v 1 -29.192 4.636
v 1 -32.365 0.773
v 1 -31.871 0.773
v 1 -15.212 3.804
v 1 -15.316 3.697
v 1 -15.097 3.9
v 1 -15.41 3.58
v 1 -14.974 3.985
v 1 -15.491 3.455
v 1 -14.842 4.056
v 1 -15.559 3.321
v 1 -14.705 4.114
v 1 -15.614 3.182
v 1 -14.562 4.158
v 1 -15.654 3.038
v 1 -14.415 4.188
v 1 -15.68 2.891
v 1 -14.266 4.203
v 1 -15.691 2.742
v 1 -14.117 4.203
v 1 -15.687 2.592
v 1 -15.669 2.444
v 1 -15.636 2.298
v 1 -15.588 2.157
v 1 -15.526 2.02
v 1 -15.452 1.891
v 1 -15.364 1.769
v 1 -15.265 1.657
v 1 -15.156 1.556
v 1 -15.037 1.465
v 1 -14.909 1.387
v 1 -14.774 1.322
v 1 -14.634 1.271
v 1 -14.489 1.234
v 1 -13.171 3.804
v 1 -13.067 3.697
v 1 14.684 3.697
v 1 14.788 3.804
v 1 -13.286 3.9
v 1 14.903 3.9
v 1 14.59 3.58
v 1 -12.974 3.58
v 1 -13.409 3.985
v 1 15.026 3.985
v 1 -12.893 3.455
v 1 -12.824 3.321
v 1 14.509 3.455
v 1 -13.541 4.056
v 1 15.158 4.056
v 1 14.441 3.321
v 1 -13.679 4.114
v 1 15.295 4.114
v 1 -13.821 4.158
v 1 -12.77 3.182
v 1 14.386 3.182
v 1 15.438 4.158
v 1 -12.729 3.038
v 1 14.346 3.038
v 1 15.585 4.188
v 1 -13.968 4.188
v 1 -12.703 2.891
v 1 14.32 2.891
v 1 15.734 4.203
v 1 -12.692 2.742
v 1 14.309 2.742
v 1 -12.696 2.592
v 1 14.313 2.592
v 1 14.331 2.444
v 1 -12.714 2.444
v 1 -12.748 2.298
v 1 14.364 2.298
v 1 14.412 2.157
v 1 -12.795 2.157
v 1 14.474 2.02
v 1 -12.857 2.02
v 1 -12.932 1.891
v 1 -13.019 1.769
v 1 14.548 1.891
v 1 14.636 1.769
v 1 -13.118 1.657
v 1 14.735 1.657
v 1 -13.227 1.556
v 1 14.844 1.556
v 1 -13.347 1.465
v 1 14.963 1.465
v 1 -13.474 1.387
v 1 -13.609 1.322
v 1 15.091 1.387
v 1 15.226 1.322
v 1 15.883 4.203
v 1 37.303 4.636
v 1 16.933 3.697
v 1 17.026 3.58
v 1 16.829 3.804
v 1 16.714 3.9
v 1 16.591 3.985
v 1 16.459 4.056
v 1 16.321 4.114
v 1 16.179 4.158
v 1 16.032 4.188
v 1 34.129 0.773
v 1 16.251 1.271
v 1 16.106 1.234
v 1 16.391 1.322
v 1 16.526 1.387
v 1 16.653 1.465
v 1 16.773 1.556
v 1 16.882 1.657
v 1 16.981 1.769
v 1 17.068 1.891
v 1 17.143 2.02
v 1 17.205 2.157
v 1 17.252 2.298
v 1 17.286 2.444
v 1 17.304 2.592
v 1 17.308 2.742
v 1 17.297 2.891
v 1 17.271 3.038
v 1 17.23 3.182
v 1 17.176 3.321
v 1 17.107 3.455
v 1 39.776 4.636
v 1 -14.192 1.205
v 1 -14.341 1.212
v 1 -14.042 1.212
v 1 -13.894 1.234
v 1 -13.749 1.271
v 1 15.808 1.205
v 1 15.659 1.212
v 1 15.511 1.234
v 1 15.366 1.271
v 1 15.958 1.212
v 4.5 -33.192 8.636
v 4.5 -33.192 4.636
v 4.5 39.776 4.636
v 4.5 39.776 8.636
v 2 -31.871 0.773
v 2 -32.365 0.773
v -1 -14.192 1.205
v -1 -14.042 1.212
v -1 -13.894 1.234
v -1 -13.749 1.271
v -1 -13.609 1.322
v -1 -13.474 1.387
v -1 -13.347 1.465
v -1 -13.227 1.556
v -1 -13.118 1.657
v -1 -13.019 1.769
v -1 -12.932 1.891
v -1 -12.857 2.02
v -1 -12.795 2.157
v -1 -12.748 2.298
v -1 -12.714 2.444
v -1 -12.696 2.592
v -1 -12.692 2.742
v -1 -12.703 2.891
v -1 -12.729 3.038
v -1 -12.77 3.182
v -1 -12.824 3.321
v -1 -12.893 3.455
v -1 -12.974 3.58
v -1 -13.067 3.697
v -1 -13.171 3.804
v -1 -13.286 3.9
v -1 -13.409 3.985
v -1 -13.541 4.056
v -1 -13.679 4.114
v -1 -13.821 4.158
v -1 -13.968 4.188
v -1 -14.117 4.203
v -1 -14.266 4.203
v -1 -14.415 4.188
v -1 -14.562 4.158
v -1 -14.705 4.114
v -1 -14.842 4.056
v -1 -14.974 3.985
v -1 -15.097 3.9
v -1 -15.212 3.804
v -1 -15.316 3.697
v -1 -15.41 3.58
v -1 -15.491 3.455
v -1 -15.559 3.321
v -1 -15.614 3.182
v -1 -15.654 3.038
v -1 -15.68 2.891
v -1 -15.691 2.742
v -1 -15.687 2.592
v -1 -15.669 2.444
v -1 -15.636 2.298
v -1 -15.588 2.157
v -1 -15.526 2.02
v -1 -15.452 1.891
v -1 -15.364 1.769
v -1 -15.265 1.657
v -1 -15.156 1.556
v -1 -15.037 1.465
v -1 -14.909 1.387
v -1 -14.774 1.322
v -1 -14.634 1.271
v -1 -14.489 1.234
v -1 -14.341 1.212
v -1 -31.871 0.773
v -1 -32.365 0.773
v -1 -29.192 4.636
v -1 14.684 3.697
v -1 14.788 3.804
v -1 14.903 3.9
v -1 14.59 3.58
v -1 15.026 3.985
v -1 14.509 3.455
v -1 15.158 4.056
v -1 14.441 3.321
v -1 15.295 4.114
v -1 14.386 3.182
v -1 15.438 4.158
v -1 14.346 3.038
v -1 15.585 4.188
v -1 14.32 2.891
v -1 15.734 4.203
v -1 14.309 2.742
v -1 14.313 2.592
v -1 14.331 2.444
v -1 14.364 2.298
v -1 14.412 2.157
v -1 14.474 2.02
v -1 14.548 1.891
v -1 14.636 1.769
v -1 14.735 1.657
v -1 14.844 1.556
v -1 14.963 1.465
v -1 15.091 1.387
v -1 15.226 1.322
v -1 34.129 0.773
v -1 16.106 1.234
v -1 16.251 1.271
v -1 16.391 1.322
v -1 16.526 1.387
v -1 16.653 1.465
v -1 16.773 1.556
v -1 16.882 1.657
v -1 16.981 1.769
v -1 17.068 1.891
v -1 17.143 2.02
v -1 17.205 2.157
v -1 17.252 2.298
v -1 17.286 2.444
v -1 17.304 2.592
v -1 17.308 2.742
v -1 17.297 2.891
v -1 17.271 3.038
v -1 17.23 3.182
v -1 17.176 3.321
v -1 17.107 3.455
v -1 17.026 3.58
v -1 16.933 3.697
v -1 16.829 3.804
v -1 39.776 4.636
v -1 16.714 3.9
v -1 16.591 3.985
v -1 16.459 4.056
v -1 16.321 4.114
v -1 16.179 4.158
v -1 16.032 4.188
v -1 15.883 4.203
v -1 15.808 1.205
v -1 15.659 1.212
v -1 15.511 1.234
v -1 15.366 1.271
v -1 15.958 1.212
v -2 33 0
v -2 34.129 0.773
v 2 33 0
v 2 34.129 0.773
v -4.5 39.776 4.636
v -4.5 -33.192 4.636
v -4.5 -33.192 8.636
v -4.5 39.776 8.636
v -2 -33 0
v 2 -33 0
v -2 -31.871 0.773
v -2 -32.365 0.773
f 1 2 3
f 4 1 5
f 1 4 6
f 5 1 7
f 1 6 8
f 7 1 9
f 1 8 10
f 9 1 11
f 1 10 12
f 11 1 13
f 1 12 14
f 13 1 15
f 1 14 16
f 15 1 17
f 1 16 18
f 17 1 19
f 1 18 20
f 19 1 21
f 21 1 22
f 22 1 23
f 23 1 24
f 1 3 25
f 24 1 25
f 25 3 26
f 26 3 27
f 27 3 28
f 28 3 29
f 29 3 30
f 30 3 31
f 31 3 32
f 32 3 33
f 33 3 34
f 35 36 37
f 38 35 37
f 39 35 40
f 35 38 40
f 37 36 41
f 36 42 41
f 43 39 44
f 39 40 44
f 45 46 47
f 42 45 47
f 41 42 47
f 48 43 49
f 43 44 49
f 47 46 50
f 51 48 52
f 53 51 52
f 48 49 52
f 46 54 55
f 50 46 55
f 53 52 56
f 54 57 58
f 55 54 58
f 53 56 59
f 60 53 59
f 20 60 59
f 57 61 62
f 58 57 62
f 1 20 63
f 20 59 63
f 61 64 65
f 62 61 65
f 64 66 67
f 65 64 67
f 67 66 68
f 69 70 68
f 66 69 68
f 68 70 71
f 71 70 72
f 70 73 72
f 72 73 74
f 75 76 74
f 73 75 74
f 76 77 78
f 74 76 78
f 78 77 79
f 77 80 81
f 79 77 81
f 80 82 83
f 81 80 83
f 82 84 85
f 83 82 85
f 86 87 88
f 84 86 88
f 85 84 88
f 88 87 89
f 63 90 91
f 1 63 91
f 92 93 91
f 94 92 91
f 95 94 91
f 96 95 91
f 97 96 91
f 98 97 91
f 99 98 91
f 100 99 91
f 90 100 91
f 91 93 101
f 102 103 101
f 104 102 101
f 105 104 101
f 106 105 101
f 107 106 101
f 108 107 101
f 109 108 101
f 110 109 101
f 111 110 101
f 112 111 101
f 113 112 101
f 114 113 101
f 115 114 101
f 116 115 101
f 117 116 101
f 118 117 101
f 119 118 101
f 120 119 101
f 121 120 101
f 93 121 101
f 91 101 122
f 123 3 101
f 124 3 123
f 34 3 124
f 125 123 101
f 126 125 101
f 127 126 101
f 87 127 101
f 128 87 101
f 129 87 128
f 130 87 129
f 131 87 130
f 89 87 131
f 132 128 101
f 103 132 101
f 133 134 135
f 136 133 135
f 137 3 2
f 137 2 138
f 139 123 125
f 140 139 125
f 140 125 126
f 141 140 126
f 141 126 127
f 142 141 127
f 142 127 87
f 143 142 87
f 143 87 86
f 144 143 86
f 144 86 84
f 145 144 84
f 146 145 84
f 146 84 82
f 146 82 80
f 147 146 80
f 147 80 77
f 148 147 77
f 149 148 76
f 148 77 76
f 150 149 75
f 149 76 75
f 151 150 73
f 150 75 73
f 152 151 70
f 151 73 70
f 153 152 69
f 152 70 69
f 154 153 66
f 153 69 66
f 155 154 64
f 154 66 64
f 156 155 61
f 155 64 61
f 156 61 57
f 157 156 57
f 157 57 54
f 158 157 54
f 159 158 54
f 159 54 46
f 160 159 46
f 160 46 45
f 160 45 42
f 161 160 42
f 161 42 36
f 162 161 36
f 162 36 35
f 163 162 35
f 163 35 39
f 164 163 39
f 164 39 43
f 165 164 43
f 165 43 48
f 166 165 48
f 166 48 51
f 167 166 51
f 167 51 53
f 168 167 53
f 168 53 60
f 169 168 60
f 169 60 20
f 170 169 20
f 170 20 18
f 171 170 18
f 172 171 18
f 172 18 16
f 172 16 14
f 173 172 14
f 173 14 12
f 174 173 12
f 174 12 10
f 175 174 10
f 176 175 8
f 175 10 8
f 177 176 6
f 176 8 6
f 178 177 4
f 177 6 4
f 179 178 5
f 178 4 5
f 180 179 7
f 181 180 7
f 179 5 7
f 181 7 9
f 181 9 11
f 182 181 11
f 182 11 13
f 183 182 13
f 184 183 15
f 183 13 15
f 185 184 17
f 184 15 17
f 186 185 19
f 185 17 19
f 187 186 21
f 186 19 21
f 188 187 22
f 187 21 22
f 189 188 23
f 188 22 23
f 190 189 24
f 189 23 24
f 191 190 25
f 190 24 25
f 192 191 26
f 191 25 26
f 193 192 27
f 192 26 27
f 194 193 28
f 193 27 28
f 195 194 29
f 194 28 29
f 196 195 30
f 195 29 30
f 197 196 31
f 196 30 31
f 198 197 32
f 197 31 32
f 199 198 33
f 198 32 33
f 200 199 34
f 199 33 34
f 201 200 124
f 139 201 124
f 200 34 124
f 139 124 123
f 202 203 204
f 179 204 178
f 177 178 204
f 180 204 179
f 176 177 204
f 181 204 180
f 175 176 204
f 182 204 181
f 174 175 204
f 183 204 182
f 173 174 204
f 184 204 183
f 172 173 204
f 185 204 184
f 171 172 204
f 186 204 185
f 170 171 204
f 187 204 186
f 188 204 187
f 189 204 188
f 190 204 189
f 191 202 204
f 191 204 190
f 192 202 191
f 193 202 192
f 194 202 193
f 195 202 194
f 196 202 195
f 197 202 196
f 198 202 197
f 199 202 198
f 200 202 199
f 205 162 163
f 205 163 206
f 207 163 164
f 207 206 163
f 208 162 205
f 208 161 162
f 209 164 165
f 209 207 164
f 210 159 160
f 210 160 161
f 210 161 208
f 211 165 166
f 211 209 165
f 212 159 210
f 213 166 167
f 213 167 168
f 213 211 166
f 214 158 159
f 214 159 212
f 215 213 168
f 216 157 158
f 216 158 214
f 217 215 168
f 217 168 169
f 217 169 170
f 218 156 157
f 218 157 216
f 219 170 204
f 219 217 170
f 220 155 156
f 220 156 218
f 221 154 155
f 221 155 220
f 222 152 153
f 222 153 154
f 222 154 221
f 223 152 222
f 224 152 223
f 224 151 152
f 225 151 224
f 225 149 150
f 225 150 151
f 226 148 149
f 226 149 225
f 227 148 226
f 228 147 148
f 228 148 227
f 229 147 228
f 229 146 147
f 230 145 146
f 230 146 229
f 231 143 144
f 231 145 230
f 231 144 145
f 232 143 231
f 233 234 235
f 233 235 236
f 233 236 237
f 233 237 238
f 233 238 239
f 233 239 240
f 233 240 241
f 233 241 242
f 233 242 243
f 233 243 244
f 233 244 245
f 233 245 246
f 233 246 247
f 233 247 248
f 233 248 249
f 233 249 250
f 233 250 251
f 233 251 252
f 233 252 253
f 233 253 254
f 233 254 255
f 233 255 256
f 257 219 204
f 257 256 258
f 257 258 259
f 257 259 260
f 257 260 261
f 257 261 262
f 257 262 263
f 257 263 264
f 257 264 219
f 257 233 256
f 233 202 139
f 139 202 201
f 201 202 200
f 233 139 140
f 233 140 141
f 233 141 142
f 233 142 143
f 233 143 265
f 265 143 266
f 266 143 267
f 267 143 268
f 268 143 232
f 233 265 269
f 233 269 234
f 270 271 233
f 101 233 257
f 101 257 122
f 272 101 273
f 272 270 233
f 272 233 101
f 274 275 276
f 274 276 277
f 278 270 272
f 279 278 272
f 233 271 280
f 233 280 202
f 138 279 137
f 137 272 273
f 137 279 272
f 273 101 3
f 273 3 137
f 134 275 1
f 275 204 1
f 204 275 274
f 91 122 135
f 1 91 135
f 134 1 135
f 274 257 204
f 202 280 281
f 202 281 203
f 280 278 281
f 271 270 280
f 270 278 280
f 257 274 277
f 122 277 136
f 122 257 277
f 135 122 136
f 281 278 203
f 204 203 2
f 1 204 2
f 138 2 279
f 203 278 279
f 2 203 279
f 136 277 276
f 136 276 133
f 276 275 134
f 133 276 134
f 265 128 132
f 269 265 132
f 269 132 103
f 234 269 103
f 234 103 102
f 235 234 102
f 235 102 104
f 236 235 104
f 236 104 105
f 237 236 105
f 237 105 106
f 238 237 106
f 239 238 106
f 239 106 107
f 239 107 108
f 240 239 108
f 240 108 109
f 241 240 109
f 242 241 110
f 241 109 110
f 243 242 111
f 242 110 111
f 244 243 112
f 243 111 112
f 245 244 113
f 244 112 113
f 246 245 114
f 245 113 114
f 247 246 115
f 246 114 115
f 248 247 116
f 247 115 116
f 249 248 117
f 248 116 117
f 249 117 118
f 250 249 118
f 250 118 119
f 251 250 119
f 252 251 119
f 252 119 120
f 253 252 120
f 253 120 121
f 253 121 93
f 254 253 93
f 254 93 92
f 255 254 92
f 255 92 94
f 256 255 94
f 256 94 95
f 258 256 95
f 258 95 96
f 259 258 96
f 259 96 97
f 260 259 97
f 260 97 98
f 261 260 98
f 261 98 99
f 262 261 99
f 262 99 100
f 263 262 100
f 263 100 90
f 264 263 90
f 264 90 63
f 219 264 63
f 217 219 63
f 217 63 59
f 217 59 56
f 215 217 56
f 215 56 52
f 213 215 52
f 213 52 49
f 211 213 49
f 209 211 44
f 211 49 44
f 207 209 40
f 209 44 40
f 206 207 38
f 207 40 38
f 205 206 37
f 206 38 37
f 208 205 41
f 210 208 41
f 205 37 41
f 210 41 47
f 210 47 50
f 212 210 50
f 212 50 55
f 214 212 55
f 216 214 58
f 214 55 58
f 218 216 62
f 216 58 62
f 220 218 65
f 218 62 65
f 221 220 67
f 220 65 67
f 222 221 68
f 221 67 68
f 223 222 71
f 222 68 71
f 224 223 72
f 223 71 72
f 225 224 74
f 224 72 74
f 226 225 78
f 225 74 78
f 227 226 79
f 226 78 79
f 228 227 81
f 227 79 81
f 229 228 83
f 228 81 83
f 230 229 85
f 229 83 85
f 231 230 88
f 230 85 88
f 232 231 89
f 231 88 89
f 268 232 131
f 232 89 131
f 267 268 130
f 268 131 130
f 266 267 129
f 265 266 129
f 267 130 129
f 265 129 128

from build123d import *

# Parameters (mm, degrees)
SKETCH1_W             = 4
SKETCH1_H             = 66
BOSS_EXTRUDE1_DEPTH   = 1
SKETCH1_2_W           = 4
SKETCH1_2_H           = 66
BOSS_EXTRUDE2_DEPTH   = 1.36844839
SKETCH4_W             = 2
SKETCH4_H             = 66.494663906
BOSS_EXTRUDE3_DEPTH   = 5
SKETCH4_2_W           = 2
SKETCH4_2_H           = 66.494663906
BOSS_EXTRUDE4_DEPTH   = 6.842238407
F_3_0MM_DOWEL_HOLE1_D = 3
SKETCH9_W             = 9
SKETCH9_H             = 72.967983433
BOSS_EXTRUDE6_DEPTH   = 4


with BuildPart() as part:
    # Sketch1 → Boss-Extrude1 (new, along a direction that is not the sketch's normal)
    with BuildSketch(Plane.XY):
        Rectangle(SKETCH1_W, SKETCH1_H)
    extrude(amount=BOSS_EXTRUDE1_DEPTH, dir=(0, 0.6347305132022716, 0.7727335734973478))

    # Sketch1<2> → Boss-Extrude2 (add, along a direction that is not the sketch's normal)
    with BuildSketch(Plane.XY):
        Rectangle(SKETCH1_2_W, SKETCH1_2_H)
    extrude(amount=BOSS_EXTRUDE2_DEPTH, dir=(0, 0.8253106586930028, 0.5646789500660725))

    # Sketch4 → Boss-Extrude3 (add, along a direction that is not the sketch's normal)
    with BuildSketch(Plane.XY.offset(0.772733573)):
        with Locations((0, 0.882062466)):
            Rectangle(SKETCH4_W, SKETCH4_H)
    extrude(amount=BOSS_EXTRUDE3_DEPTH, dir=(0, 0.6347305132022716, 0.7727335734973478))

    # Sketch4<2> → Boss-Extrude4 (add, along a direction that is not the sketch's normal)
    with BuildSketch(Plane.XY.offset(0.772733573)):
        with Locations((0, 0.882062466)):
            Rectangle(SKETCH4_2_W, SKETCH4_2_H)
    extrude(amount=BOSS_EXTRUDE4_DEPTH, dir=(0, 0.8253106586930028, 0.5646789500660725))

    # Ø3.0mm Dowel Hole1 (through all)
    with Locations(Plane.ZY.offset(1)):
        with Locations((2.704567507, -14.191616921), (2.704567507, 15.808383079)):
            Hole(F_3_0MM_DOWEL_HOLE1_D / 2)

    # Sketch9 → Boss-Extrude6 (add)
    with BuildSketch(Plane.XY.offset(4.636401441)):
        with Locations((0, 3.292374795)):
            Rectangle(SKETCH9_W, SKETCH9_H)
    extrude(amount=BOSS_EXTRUDE6_DEPTH)


solid = part.part
